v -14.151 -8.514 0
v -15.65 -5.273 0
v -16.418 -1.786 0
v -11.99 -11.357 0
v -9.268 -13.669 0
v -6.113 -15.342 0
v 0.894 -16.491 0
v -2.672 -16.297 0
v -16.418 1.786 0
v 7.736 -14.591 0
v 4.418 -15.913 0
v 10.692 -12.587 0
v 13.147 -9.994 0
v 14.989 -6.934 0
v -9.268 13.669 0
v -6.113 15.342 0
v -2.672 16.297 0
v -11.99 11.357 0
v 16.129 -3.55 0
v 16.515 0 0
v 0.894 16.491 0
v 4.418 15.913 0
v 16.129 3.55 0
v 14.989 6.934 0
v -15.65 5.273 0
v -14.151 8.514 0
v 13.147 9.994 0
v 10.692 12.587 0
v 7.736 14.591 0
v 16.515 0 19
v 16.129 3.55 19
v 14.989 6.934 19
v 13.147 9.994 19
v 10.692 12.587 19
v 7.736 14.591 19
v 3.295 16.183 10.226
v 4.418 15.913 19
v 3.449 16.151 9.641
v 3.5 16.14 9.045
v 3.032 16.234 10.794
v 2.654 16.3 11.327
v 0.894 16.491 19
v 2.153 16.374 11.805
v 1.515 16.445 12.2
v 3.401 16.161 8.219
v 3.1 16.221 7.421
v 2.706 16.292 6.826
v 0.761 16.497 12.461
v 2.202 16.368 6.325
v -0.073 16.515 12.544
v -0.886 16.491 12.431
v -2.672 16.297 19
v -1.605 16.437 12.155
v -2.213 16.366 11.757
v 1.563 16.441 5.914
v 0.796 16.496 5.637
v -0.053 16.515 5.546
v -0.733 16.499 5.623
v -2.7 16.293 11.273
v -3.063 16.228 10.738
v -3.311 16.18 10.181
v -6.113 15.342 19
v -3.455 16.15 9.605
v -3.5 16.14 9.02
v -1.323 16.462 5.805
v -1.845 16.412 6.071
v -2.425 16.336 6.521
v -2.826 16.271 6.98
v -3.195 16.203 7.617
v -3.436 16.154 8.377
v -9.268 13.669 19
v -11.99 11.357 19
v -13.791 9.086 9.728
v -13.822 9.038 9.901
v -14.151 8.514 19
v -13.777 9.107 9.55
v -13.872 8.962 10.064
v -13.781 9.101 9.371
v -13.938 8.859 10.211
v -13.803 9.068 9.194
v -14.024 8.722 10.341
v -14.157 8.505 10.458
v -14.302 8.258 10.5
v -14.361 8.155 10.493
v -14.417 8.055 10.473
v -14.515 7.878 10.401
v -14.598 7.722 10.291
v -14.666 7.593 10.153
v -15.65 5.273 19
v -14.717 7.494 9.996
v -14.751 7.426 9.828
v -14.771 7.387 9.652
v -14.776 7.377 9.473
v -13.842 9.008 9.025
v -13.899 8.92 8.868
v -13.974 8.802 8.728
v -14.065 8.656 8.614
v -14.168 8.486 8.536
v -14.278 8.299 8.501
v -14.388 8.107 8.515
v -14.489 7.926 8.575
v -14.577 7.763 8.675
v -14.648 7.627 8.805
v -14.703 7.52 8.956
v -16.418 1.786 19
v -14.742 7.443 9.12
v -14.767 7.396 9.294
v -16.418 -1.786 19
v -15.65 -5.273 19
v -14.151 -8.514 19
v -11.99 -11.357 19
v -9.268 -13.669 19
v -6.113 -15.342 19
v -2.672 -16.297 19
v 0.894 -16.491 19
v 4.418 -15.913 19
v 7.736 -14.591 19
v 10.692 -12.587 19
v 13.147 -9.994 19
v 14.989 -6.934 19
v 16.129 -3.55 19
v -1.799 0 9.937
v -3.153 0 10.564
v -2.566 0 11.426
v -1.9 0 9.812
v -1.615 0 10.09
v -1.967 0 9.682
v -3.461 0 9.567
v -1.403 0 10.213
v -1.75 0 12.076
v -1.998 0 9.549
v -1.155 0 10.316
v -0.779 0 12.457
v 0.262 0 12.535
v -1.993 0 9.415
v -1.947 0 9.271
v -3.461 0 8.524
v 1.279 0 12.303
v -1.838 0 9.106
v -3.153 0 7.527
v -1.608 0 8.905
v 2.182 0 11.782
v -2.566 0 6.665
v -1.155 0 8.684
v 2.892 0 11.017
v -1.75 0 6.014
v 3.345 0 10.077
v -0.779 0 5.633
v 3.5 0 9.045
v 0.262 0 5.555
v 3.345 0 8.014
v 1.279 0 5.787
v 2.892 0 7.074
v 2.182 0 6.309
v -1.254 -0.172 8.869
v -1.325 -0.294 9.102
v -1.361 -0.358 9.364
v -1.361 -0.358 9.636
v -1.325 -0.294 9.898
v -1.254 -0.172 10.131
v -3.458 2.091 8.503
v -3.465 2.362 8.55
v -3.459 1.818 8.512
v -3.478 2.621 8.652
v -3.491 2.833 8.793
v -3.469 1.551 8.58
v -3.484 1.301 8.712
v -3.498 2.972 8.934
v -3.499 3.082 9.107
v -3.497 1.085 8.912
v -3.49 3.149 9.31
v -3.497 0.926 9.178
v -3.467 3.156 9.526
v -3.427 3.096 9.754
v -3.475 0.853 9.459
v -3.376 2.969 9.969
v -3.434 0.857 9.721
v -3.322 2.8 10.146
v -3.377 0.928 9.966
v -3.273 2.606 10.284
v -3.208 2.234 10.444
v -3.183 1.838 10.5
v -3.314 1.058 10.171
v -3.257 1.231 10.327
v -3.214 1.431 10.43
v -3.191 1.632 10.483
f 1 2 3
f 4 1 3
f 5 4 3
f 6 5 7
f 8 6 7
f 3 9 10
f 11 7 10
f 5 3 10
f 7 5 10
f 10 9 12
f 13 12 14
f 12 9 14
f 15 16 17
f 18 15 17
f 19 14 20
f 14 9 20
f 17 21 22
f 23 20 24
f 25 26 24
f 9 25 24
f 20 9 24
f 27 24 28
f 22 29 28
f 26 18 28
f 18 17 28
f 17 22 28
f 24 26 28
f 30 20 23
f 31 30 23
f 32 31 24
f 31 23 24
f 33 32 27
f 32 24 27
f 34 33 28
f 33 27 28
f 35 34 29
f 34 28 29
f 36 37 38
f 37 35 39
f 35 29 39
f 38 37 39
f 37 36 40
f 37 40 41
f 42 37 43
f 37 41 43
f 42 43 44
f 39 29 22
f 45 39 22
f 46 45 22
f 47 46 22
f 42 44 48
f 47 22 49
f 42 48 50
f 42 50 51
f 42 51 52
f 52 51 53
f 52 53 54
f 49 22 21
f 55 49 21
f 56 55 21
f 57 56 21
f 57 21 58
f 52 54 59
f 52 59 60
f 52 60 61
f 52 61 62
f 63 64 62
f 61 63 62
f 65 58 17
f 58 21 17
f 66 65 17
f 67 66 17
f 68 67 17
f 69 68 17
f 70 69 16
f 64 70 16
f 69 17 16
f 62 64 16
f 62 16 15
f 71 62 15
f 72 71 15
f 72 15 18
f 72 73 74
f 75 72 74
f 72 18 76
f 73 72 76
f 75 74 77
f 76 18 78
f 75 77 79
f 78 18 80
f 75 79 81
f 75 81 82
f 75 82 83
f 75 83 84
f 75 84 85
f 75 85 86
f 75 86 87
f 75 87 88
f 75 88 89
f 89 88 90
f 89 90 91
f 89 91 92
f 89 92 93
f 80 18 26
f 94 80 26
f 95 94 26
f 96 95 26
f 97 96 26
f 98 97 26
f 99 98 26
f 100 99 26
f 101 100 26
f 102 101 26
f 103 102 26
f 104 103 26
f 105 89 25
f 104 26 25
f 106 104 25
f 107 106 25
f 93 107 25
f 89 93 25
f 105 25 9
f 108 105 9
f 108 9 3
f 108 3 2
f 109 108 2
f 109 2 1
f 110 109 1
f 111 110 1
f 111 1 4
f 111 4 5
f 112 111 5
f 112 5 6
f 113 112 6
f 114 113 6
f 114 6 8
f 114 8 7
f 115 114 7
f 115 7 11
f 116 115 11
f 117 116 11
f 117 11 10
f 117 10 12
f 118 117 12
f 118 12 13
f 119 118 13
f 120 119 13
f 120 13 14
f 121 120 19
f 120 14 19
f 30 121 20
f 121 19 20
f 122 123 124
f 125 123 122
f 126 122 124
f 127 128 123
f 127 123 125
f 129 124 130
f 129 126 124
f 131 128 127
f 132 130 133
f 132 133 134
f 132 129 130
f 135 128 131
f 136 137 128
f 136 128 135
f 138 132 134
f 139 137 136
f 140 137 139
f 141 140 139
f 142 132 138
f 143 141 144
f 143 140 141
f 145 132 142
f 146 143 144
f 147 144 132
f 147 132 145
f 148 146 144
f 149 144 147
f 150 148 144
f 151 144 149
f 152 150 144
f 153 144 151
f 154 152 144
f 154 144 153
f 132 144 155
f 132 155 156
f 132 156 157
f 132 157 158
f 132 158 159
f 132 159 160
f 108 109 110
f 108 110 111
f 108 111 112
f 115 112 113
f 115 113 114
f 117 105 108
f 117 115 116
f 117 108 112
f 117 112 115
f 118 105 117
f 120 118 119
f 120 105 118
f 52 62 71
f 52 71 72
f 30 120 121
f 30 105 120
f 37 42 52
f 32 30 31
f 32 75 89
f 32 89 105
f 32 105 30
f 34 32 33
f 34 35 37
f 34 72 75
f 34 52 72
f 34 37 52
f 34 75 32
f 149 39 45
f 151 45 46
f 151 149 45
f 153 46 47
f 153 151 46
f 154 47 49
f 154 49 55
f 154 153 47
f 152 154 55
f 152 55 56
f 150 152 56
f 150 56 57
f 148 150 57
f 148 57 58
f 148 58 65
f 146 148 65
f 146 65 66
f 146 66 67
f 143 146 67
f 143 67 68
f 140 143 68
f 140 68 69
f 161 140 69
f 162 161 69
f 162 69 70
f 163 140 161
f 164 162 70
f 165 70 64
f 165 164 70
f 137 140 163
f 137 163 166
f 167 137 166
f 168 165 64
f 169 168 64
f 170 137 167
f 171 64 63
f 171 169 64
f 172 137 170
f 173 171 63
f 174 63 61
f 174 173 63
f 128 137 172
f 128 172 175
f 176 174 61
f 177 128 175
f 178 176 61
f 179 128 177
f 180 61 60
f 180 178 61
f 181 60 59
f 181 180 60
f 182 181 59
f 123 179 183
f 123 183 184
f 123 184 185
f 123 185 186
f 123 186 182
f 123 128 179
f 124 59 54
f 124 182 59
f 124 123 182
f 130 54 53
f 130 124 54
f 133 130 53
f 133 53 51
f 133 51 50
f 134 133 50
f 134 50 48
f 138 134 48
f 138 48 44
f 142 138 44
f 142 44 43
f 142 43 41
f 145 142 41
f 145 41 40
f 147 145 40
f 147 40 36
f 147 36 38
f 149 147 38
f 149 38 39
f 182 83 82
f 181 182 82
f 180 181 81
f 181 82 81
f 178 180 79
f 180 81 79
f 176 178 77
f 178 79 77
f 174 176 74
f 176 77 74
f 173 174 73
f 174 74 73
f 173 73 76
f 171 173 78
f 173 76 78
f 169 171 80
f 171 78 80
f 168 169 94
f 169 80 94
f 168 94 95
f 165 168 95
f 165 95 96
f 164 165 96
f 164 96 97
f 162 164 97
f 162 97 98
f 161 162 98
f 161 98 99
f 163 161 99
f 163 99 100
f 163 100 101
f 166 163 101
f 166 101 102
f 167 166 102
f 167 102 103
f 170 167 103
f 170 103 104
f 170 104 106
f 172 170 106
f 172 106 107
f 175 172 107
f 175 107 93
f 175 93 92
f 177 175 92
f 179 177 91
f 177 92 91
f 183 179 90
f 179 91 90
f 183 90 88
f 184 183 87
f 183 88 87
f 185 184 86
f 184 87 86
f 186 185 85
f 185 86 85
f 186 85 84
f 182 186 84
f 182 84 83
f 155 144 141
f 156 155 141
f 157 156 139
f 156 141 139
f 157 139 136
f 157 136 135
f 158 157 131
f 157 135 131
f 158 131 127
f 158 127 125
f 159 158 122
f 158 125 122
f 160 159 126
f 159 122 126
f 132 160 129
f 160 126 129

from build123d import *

# Parameters (mm, degrees)
SKETCH1_R           = 16.515
BOSS_EXTRUDE1_DEPTH = 19
SKETCH2_R           = 3.5
CUT_EXTRUDE1_DEPTH  = 31.107979839
SKETCH4_R           = 1
CUT_EXTRUDE2_DEPTH  = 19


with BuildPart() as part:
    # Sketch1 → Boss-Extrude1 (new body)
    with BuildSketch(Plane.XY):
        Circle(SKETCH1_R)
    extrude(amount=BOSS_EXTRUDE1_DEPTH)

    # Sketch2 → Cut-Extrude1 (cut, through all)
    with BuildSketch(Plane(origin=(0, 0, 0), x_dir=(1, 0, 0), z_dir=(0, 1, 0))):
        with Locations((0, -9.045224282)):
            Circle(SKETCH2_R)
    extrude(amount=CUT_EXTRUDE1_DEPTH, mode=Mode.SUBTRACT)

    # Sketch4 → Cut-Extrude2 (cut)
    with BuildSketch(Plane(origin=(-17.320508076, 10, 0), x_dir=(0, 0, 1), z_dir=(-0.86602540378444, 0.49999999999999784, 0))):
        with Locations((9.5, 0)):
            Circle(SKETCH4_R)
    extrude(amount=-CUT_EXTRUDE2_DEPTH, mode=Mode.SUBTRACT)


solid = part.part
